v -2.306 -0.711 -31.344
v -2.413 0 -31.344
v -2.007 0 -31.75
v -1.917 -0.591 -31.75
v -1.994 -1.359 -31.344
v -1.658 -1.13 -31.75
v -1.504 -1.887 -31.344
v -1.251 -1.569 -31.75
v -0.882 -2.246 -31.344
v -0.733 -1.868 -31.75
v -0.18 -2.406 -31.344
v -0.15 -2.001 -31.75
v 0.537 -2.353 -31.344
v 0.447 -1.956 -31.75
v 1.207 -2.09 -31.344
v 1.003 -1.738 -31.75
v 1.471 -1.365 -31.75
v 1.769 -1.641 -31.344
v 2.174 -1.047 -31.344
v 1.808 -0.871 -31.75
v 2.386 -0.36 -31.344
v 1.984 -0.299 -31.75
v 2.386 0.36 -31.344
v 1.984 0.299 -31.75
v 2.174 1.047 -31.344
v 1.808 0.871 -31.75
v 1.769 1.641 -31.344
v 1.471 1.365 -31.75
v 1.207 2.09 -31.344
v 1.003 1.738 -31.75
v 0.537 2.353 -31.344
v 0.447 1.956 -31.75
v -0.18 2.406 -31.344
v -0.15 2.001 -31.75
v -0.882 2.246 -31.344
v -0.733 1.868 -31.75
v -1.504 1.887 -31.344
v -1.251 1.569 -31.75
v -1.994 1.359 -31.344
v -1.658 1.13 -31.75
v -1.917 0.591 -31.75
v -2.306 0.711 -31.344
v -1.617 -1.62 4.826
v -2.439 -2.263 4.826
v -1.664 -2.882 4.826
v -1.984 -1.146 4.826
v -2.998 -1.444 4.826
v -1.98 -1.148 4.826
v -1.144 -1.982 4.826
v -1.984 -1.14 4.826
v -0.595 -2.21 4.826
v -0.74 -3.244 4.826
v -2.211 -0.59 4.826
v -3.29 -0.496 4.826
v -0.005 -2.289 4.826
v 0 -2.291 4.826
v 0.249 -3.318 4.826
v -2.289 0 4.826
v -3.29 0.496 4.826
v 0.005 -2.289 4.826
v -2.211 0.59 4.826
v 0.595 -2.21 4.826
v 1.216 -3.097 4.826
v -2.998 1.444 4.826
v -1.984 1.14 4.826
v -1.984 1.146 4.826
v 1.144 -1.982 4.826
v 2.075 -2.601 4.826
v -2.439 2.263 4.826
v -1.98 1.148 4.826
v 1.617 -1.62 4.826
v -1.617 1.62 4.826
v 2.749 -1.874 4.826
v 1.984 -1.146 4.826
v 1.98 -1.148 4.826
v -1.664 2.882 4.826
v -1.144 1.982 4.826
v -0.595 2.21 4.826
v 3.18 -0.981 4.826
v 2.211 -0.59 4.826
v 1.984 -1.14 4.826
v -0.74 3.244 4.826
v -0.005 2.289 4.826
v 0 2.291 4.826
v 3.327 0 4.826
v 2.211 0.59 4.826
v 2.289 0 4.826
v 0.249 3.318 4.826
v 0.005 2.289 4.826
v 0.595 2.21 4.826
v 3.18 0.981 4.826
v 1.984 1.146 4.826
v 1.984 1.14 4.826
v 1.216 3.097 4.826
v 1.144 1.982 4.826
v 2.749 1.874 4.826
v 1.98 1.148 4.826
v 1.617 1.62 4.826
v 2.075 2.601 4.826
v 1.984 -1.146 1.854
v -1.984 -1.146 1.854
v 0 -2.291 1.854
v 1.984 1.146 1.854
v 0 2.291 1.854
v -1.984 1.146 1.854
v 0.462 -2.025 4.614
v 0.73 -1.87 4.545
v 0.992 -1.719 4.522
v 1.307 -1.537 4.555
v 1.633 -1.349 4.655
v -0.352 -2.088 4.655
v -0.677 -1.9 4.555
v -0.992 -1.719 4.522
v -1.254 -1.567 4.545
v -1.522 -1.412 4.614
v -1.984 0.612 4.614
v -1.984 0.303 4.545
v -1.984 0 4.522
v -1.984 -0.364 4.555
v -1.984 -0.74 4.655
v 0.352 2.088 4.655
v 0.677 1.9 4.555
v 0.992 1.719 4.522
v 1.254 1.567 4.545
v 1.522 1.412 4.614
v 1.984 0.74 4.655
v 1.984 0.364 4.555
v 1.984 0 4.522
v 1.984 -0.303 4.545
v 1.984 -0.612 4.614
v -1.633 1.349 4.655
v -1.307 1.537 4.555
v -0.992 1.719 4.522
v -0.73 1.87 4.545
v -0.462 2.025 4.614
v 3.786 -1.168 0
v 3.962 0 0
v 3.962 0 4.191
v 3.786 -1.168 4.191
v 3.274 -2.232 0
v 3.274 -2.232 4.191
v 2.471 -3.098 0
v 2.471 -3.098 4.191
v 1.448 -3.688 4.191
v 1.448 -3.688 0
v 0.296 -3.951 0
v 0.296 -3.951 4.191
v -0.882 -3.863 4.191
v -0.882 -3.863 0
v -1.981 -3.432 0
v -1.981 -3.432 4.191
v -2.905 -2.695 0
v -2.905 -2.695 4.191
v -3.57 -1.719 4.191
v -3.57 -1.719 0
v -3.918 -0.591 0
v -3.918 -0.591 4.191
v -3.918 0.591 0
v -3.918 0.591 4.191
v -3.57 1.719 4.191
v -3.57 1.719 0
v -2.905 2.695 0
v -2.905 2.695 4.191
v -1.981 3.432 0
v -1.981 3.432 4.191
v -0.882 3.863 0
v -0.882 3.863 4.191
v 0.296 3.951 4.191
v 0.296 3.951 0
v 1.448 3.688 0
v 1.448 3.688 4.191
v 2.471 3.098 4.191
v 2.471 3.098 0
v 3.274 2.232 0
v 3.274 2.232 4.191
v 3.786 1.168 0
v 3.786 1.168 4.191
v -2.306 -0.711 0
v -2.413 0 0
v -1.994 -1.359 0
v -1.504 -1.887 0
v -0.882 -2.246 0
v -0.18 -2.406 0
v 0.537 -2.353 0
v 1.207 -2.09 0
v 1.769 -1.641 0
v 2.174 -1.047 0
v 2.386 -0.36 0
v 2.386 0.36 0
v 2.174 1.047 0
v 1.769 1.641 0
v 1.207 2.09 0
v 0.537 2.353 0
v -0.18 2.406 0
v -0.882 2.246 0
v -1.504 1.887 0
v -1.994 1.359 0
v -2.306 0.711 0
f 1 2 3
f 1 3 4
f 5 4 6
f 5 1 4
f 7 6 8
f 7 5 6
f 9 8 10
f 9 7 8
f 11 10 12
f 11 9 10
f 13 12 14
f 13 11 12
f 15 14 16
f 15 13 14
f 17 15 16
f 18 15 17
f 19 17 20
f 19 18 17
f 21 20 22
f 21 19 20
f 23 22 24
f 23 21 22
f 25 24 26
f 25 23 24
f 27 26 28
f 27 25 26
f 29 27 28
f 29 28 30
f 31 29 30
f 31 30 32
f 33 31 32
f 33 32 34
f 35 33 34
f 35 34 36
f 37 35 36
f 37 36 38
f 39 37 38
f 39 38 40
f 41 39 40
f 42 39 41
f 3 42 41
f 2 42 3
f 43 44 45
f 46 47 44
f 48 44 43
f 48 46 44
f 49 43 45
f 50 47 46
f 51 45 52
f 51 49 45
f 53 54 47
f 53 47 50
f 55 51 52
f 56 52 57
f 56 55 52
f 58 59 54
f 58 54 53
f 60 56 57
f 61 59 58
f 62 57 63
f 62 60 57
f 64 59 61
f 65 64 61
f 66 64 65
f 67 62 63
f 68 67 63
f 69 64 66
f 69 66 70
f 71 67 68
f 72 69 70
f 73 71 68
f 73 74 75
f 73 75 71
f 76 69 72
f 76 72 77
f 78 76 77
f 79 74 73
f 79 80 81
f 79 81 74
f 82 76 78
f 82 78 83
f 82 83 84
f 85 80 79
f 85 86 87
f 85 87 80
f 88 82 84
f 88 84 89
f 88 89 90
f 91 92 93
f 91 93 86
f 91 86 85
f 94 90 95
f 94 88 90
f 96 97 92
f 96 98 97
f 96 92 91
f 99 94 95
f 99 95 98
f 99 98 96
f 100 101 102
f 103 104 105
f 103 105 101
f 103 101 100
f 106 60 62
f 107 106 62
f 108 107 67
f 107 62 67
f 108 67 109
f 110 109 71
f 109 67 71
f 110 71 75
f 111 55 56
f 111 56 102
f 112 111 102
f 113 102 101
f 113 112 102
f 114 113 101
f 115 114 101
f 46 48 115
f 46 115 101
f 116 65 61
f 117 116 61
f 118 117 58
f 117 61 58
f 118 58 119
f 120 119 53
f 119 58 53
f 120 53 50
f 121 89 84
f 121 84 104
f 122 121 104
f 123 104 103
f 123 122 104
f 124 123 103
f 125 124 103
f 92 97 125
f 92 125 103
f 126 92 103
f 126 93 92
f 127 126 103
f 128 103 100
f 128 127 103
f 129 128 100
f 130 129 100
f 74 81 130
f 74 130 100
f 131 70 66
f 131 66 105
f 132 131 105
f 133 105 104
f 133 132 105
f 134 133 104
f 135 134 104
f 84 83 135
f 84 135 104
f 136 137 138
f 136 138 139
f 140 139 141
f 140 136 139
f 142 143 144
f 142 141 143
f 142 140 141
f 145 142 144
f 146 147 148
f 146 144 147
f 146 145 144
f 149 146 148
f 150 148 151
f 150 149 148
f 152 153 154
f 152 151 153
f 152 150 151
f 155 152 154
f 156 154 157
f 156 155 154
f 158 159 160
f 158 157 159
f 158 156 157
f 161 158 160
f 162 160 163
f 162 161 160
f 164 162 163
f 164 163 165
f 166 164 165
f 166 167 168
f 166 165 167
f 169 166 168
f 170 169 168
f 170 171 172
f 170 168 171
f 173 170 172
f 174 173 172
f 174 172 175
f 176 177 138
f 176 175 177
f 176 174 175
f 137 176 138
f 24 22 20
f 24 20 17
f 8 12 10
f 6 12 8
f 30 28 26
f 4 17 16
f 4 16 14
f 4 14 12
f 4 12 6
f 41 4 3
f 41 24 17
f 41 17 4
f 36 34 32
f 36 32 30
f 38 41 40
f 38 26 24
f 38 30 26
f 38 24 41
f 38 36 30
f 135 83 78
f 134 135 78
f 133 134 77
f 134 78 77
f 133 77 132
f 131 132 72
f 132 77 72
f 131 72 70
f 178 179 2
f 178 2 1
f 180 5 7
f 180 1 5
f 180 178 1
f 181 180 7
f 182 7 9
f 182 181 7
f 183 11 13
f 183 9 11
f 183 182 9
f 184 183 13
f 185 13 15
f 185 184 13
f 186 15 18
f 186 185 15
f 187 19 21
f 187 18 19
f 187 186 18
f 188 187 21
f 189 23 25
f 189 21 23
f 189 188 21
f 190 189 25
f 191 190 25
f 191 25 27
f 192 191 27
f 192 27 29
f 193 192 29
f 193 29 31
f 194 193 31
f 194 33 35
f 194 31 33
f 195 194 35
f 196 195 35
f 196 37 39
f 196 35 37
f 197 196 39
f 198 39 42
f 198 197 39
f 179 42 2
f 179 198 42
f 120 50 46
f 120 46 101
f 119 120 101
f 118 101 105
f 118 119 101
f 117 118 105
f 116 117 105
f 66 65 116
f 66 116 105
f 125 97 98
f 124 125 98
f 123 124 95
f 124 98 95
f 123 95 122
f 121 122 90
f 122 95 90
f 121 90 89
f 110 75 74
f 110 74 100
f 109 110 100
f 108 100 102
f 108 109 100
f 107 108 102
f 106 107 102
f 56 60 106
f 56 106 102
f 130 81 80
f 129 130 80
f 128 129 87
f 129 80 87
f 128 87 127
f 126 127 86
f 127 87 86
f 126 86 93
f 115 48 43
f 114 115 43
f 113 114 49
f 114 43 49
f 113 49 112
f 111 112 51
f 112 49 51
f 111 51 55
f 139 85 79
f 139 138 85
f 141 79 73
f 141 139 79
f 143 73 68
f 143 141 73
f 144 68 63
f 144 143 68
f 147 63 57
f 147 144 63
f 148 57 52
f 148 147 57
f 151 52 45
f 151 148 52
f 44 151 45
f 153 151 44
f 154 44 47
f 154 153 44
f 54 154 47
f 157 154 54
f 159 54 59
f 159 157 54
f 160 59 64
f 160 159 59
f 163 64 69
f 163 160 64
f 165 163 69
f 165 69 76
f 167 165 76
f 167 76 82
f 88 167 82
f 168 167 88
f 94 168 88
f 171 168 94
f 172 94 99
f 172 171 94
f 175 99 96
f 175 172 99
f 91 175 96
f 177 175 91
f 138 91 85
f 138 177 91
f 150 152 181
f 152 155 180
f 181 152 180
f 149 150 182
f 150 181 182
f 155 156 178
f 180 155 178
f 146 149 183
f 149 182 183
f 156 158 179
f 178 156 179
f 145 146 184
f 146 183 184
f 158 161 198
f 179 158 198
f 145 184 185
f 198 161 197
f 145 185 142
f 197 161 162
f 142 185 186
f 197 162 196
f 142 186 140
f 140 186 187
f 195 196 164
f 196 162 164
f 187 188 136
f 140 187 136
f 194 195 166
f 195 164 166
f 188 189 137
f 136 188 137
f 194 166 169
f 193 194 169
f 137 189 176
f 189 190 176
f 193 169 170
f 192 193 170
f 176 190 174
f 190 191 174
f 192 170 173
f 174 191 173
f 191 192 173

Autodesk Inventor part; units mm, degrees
ref_plane "YZ Plane" through (0, 0, 0) normal (1, 0, 0) x (0, 1, 0)
ref_plane "XZ Plane" through (0, 0, 0) normal (0, 1, 0) x (-1, 0, 0)
ref_plane "XY Plane" through (0, 0, 0) normal (0, 0, 1) x (1, 0, 0)
sketch "Sketch1" plane through (0, 0, 0) normal (0, 0, 1) x (1, 0, 0)
  circle A0 centre (0, 0) radius 3.9624
  dimension "cap_diam" = 7.9248
extrude "Extrusion1" add sketch "Sketch1" along normal blind 4.826
sketch "Sketch2" plane through (0, 0, 0) normal (0, 0, -1) x (-1, 0, 0)
  circle A0 centre (0, 0) radius 3.9624 projected
  circle A1 centre (0, 0) radius 2.413
  dimension "thread_diam" = 4.826
extrude "Extrusion2" add sketch "Sketch2" along normal blind 31.75 contours A1
thread "Thread1" size "10-32 UNF" class "2A" standard "ANSI Unified Screw Threads" length 25.4
chamfer "Chamfer1" distance 0.4064 angle 45 1 edges at (2.413, 0, -31.75)
chamfer "Chamfer2" distance 0.635 angle 45 1 edges at (-3.9624, 0, 4.826)
sketch "Sketch4" plane through (0, 0, 4.826) normal (0, 0, 1) x (1, 0, 0)
  circle A0 centre (0, 0) radius 3.3274 projected
  circle A1 centre (0, 0) radius 1.9844
  dimension "d21" = 3.9688
extrude "Extrusion4" cut sketch "Sketch4" against normal blind 0.3048 contours A1
chamfer "Chamfer3" distance 0.3048 angle 45 1 edges at (-1.9844, 0, 4.826)
sketch "Sketch5" plane through (0, 0, 4.826) normal (0, 0, 1) x (1, 0, 0)
  circle A0 centre (0, 0) radius 2.2892 construction
  line L0 (0, 2.2914) -> (1.9844, 1.1457)
  line L1 (1.9844, 1.1457) -> (1.9844, -1.1457)
  line L2 (1.9844, -1.1457) -> (0, -2.2914)
  line L3 (0, -2.2914) -> (-1.9844, -1.1457)
  line L4 (-1.9844, -1.1457) -> (-1.9844, 1.1457)
  line L5 (-1.9844, 1.1457) -> (0, 2.2914)
  dimension "d27" = 3.9688
extrude "Extrusion5" cut sketch "Sketch5" against normal blind 2.9718
equation "\"d21\" = hex_diam"
equation "\"hex_diam\" = 3.96875"
properties part number "10-32 x1000" material "Steel"
